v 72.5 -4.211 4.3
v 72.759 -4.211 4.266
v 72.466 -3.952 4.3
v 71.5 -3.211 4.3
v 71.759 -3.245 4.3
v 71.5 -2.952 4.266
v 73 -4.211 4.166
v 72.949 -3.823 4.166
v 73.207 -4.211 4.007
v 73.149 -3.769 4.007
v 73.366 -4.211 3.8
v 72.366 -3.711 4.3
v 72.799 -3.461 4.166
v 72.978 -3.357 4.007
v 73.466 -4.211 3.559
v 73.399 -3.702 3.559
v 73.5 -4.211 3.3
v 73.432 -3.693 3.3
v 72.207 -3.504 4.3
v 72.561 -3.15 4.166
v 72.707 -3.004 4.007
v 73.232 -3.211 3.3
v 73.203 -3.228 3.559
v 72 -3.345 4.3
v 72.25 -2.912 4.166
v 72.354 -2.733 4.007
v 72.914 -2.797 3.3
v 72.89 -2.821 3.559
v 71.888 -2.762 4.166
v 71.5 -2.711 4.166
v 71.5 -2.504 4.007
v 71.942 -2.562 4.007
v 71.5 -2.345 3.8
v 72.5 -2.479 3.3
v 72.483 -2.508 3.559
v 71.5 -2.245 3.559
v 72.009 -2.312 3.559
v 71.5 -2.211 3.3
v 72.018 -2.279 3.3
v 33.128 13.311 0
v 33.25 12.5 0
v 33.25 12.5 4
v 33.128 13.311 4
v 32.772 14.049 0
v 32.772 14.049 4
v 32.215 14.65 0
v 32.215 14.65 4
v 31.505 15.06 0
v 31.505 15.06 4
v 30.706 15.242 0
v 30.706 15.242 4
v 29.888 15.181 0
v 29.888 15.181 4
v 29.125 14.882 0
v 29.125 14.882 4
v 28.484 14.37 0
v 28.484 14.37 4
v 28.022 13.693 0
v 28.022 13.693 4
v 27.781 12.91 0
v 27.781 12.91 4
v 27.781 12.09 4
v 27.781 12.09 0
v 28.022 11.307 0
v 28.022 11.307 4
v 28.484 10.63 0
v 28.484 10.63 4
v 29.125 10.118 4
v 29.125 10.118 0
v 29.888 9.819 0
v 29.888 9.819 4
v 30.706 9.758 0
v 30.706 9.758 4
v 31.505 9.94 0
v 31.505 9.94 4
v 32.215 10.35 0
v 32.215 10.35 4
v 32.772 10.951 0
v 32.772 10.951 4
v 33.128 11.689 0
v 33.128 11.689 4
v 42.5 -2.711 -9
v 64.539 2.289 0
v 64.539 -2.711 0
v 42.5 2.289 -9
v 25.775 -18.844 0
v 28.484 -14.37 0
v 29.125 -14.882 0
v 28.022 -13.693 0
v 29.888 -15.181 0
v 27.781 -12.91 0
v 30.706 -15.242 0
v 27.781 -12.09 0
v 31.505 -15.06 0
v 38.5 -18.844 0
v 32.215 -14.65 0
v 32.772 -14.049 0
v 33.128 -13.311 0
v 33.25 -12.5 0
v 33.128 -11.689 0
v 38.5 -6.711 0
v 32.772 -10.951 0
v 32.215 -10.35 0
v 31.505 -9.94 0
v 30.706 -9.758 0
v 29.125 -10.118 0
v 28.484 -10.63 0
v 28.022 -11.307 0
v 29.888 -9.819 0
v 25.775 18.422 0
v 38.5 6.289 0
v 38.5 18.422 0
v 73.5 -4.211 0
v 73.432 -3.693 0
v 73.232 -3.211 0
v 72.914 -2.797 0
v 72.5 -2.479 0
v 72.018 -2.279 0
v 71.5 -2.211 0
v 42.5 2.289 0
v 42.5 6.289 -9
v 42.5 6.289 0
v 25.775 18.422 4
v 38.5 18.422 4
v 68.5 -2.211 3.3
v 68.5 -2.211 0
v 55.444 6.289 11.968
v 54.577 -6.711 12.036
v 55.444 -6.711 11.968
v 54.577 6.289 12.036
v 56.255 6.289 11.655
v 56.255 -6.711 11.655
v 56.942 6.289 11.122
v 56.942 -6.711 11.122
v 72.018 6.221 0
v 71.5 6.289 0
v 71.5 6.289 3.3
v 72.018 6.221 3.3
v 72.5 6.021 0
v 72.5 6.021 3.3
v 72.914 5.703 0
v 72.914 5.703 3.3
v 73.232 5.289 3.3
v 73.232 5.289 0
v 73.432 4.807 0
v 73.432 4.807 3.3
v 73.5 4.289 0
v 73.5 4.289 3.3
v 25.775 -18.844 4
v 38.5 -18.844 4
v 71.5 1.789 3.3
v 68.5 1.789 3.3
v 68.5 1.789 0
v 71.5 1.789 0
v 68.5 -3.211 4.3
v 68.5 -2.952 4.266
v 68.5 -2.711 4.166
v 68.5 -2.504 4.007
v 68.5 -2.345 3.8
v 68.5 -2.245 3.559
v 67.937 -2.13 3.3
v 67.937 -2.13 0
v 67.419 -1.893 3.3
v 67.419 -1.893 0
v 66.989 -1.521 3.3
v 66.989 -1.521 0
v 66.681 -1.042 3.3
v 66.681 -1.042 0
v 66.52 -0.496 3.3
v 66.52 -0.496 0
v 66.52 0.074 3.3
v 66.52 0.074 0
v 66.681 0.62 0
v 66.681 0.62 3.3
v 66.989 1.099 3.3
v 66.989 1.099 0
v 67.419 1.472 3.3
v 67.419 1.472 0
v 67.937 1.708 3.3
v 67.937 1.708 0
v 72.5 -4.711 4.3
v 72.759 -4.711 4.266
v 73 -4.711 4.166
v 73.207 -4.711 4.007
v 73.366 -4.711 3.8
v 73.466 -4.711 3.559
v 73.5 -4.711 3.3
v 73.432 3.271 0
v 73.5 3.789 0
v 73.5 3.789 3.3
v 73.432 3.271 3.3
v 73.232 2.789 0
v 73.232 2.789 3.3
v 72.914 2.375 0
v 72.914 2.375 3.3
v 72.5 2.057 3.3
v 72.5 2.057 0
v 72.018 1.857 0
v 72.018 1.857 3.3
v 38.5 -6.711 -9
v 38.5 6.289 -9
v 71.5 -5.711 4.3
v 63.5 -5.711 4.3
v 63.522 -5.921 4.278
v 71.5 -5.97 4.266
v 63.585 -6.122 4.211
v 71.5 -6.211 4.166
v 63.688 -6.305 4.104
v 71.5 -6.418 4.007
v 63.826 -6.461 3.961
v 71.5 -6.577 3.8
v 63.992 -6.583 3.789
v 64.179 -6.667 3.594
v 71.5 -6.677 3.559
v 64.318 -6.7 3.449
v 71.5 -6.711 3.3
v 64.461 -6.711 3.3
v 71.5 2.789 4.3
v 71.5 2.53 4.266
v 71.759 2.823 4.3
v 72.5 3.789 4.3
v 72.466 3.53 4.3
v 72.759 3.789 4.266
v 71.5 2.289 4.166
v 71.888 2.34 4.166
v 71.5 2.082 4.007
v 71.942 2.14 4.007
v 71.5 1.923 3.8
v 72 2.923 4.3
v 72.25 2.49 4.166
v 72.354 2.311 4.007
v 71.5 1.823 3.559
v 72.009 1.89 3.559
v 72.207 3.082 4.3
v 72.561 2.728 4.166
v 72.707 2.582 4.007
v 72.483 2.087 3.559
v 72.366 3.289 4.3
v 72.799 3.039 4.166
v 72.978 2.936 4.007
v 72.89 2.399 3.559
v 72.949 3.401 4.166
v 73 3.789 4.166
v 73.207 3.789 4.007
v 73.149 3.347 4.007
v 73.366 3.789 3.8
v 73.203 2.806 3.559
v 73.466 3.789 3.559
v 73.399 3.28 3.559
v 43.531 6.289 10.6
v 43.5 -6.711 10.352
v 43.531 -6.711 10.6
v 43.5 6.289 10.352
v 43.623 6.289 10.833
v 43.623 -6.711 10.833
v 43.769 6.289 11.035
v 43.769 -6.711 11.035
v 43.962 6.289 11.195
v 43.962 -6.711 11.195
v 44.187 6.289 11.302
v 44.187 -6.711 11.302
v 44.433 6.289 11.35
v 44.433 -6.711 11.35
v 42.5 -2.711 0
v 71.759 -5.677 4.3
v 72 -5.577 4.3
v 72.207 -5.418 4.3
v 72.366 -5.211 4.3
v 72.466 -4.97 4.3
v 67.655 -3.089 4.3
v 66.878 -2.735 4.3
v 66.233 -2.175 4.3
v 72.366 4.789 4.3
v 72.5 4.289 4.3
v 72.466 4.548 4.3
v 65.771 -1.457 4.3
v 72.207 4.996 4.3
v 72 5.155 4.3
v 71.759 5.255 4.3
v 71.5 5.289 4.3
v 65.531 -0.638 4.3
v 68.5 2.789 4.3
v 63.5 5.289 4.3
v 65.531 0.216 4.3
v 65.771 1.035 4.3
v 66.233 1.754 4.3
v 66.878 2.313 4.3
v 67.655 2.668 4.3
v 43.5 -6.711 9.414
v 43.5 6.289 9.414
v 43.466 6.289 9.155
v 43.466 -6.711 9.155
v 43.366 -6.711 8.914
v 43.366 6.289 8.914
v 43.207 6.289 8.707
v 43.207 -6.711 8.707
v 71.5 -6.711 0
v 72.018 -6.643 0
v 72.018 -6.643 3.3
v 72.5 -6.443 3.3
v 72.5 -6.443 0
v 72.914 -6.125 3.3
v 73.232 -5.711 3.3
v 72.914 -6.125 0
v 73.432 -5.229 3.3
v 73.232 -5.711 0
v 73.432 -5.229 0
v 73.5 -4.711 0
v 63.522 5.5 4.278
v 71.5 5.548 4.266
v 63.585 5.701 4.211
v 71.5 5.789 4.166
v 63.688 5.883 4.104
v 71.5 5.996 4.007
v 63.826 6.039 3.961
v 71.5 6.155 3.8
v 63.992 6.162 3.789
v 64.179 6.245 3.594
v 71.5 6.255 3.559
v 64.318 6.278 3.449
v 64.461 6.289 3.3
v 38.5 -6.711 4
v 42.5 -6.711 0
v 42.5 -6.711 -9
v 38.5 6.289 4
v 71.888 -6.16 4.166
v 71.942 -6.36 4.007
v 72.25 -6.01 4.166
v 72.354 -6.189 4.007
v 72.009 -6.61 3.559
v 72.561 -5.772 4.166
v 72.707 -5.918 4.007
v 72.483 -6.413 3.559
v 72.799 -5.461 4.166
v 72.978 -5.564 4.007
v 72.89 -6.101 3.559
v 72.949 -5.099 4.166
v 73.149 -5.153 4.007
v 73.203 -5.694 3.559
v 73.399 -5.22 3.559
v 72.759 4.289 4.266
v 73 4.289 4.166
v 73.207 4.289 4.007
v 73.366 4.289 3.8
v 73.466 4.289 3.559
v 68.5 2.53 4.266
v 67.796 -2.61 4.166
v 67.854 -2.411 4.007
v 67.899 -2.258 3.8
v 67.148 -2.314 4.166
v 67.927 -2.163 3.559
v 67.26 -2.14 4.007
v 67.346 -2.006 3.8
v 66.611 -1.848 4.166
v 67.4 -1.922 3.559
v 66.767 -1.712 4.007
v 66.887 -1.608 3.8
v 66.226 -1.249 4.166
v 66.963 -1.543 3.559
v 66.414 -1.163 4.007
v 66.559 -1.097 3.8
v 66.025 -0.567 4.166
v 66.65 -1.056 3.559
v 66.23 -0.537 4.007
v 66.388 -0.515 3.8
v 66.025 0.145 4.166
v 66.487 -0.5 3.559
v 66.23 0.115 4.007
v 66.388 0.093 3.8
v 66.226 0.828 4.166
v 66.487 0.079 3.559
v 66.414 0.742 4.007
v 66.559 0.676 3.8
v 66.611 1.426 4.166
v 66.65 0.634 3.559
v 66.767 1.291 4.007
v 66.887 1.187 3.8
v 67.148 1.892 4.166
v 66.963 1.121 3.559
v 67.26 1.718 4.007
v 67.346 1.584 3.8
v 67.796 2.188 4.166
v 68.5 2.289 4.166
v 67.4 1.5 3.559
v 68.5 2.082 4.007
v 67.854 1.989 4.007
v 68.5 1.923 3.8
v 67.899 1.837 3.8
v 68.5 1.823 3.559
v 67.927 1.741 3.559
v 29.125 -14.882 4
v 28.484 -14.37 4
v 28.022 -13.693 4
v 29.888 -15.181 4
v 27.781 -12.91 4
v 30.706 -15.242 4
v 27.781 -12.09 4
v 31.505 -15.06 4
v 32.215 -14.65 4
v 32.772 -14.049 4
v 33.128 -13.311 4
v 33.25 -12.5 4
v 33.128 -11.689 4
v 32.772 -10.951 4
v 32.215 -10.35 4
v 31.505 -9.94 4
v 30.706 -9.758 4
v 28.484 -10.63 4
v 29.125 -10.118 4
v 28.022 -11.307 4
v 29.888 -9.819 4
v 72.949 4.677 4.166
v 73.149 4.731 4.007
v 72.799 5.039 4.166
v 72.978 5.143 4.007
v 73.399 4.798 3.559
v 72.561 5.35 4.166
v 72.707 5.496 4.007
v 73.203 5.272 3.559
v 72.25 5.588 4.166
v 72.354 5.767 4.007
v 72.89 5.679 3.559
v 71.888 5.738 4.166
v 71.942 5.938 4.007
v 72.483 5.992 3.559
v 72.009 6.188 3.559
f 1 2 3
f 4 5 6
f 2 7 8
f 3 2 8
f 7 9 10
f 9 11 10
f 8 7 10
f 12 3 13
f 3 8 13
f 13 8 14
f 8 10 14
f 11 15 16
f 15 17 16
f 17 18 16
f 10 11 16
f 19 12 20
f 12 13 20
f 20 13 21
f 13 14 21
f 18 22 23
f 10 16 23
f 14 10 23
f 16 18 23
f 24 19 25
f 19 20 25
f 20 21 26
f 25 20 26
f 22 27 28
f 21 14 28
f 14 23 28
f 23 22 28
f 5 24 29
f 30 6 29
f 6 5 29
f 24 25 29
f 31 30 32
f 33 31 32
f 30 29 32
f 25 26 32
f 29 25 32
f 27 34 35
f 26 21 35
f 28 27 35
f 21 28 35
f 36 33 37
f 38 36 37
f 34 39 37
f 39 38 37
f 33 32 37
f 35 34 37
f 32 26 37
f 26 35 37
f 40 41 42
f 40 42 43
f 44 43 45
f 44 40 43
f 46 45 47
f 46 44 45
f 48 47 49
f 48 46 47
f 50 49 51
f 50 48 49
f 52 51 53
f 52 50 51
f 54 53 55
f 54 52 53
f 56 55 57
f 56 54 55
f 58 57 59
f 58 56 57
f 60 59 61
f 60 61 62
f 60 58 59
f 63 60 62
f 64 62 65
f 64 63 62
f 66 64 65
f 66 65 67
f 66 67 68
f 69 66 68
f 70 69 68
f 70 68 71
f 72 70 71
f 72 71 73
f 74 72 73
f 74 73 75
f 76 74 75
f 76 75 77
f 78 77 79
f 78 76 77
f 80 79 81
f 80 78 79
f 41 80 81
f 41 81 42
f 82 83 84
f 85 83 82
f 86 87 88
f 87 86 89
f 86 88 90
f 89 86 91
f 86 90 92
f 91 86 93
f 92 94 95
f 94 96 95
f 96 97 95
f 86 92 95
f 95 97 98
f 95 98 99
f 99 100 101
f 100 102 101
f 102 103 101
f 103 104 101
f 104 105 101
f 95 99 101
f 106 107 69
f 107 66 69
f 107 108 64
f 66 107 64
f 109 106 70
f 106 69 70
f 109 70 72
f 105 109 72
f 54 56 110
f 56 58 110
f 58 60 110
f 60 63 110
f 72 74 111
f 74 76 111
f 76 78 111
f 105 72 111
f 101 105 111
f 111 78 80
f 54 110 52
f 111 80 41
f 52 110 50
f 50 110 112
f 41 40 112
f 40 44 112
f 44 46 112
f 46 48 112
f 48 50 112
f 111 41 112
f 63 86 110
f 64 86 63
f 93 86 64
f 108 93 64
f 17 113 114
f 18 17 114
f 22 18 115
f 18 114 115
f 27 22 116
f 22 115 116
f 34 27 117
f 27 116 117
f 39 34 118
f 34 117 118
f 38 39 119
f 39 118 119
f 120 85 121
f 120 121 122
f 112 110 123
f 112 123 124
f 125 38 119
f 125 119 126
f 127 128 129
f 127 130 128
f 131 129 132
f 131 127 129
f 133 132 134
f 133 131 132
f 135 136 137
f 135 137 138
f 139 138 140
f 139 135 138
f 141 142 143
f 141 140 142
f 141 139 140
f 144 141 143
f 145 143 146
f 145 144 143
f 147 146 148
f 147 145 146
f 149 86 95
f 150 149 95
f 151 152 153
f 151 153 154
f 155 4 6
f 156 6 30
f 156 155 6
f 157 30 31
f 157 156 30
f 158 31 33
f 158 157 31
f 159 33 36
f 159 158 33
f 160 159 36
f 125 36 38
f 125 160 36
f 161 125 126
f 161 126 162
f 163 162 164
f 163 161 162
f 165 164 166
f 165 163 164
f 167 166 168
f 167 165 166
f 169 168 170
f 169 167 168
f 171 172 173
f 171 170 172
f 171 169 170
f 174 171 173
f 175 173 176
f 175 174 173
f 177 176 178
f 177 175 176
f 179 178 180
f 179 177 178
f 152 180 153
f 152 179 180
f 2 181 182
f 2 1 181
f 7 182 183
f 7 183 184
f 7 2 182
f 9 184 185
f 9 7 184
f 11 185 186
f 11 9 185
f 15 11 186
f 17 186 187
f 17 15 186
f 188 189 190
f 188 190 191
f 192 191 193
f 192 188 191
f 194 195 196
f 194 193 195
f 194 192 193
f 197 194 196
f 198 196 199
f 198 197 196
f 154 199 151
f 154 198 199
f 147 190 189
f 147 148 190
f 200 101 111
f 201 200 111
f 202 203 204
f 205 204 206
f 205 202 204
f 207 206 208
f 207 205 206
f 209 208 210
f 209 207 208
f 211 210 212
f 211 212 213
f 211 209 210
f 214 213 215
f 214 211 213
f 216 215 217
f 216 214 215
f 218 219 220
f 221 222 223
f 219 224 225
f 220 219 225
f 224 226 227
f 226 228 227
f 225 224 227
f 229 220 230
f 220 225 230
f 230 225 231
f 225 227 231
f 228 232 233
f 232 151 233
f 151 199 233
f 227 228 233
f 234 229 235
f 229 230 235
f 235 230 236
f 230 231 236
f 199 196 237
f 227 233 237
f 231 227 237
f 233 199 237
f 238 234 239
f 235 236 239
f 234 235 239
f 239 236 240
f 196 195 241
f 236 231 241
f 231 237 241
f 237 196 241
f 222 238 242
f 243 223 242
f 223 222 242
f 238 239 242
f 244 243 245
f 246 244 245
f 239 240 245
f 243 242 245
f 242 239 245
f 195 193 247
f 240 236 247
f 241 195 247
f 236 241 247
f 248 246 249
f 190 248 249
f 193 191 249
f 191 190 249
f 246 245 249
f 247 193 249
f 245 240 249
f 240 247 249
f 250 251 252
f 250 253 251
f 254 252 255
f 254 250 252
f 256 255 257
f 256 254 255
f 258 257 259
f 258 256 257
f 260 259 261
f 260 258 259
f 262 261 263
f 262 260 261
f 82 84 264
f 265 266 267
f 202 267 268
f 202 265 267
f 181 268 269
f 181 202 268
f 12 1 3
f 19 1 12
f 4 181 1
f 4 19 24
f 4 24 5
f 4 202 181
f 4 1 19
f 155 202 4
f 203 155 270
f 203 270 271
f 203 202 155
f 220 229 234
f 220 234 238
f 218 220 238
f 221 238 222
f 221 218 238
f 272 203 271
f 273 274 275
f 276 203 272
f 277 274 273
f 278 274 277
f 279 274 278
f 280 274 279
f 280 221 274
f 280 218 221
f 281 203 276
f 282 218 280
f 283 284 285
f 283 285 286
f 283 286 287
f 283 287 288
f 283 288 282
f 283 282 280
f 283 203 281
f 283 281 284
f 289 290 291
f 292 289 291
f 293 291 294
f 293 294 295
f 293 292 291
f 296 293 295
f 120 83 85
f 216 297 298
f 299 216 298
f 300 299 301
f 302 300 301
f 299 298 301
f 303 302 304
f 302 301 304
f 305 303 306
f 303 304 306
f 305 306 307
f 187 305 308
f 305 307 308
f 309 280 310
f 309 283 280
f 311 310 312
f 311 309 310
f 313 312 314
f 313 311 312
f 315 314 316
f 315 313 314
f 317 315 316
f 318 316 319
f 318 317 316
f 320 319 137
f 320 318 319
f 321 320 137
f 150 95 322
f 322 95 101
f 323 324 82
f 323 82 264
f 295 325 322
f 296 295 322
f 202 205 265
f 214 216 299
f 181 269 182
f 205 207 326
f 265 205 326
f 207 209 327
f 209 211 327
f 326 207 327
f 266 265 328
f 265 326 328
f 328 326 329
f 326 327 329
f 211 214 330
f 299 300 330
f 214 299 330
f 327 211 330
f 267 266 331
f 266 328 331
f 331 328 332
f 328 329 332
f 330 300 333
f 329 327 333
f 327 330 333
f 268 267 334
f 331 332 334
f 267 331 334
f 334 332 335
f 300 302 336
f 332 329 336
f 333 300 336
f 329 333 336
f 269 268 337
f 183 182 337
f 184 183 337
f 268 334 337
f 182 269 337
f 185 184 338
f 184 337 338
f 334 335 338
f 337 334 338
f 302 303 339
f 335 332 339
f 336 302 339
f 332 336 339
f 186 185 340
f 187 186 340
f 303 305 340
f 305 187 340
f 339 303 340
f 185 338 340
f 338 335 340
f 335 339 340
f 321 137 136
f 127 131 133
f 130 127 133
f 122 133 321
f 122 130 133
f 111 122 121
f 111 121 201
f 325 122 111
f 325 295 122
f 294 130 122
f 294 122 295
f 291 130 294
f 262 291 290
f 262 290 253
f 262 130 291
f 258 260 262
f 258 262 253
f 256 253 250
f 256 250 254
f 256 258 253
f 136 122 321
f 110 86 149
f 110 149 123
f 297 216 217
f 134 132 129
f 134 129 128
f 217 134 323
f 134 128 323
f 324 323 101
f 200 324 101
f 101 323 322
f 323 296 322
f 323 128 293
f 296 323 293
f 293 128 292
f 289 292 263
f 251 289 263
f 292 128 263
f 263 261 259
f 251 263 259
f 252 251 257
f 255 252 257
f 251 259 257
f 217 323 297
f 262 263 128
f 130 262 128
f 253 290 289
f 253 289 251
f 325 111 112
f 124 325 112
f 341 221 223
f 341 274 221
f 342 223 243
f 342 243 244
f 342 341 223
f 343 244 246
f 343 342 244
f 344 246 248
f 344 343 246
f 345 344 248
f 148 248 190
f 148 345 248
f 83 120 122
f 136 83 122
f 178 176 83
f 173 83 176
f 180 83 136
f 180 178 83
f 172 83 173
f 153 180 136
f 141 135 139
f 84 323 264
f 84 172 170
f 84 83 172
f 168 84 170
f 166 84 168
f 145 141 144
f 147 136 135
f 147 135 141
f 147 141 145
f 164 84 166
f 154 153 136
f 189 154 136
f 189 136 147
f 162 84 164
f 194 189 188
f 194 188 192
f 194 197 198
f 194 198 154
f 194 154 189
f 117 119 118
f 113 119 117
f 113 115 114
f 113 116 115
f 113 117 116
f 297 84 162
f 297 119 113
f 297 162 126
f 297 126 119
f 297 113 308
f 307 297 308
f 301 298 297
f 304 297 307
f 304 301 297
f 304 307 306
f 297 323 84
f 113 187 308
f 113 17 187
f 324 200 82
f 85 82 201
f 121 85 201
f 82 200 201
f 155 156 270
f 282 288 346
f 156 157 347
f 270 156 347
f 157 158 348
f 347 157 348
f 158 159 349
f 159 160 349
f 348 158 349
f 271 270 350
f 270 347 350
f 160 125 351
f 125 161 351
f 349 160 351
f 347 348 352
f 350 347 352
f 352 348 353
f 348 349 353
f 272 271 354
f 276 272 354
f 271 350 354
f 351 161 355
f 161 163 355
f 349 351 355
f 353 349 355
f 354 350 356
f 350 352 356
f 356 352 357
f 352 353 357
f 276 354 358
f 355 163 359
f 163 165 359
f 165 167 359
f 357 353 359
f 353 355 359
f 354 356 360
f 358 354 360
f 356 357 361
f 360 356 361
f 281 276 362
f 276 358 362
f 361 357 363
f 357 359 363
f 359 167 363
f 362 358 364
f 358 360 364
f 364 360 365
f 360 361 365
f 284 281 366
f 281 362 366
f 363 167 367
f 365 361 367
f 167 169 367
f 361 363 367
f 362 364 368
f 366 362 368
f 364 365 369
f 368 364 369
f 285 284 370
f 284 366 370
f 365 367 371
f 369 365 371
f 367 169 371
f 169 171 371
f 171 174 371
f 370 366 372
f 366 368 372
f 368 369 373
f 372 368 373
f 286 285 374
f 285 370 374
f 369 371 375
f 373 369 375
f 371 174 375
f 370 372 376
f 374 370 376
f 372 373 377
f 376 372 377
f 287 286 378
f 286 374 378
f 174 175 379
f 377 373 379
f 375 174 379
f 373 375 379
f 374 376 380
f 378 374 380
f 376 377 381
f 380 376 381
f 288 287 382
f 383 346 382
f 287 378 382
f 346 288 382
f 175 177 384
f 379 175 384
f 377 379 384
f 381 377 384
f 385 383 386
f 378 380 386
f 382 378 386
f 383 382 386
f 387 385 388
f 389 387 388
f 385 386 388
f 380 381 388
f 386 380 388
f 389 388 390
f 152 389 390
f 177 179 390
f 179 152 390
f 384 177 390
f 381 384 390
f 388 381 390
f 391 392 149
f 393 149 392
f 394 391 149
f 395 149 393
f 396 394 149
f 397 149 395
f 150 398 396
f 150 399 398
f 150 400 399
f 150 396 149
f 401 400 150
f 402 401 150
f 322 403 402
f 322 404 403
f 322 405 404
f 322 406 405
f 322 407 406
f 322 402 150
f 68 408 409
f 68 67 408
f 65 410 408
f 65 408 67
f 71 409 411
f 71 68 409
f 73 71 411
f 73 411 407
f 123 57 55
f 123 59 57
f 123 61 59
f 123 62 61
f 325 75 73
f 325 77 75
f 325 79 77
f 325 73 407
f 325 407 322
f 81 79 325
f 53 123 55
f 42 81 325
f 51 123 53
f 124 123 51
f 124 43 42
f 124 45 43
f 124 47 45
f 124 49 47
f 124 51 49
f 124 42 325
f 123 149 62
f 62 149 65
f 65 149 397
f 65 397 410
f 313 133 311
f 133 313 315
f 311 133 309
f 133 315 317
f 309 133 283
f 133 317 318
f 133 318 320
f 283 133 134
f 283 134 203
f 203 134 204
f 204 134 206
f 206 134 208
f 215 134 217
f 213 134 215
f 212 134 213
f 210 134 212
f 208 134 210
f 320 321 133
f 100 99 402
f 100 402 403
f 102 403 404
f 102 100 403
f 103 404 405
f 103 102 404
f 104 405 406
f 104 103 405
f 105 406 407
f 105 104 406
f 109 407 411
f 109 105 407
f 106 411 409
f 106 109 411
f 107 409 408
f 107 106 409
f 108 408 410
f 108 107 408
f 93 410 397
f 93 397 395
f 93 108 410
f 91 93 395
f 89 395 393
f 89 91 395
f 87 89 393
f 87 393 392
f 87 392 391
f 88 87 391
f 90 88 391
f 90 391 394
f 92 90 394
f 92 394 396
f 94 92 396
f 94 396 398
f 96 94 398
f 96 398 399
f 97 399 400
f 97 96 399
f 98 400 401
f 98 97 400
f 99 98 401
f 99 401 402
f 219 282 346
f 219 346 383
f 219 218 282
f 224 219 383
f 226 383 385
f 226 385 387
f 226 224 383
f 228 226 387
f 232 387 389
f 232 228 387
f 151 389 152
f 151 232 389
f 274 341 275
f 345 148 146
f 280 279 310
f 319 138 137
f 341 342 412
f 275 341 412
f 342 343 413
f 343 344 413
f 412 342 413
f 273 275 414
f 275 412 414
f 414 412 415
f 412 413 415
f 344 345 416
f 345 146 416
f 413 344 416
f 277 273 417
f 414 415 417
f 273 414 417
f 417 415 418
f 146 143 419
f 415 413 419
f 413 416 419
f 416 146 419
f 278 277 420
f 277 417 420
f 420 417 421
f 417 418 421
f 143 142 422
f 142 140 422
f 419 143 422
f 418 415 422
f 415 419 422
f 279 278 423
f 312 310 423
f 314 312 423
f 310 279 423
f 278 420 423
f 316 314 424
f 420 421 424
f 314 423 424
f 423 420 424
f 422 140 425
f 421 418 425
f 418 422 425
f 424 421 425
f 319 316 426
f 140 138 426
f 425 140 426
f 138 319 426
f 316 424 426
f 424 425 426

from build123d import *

# Parameters (mm, degrees)
SKETCH_2_W          = 12.724713087
SKETCH_2_H          = 37.266218859
SKETCH_2_R          = 2.75
EXTRUDE_1_DEPTH     = 4
SKETCH_3_W          = 5
SKETCH_3_H          = 13
EXTRUDE_2_DEPTH     = 4
SKETCH_4_W          = 5
SKETCH_4_H          = 13
EXTRUDE_4_DEPTH     = 9
SKETCH_5_W          = 13.3
SKETCH_5_H          = 13
EXTRUDE_5_DEPTH     = 30
CUT_EXTRUDE_2_DEPTH = 78.033997806
EXTRUDE_6_DEPTH     = 13
FILLET_4_R          = 3
SKETCH_12_W         = 31
SKETCH_12_H         = 9
CUT_EXTRUDE_3_DEPTH = 79.606298904
RIB_1_REACH         = 78.775
SKETCH_13_WALL_W    = 179.357132042
SKETCH_13_WALL_H    = 5
CHAMFER_1_SIZE      = 5
FILLET_5_R          = 1
FILLET_6_R          = 2
FILLET_7_R          = 1


with BuildPart() as part:
    # 草图2 → 凸台-拉伸1 (new body)
    with BuildSketch(Plane.XY):
        with Locations((32.137643457, -0.210903357)):
            Rectangle(SKETCH_2_W, SKETCH_2_H)
        with Locations((30.5, -12.5)):
            Circle(SKETCH_2_R, mode=Mode.SUBTRACT)
        with Locations((30.5, 12.5)):
            Circle(SKETCH_2_R, mode=Mode.SUBTRACT)
    extrude(amount=EXTRUDE_1_DEPTH)

    # 草图3 → 凸台-拉伸2 (add)
    with BuildSketch(Plane(origin=(0, 230.908781145, 0), x_dir=(-1, 0, 0), z_dir=(0, 0, 1))):
        with Locations((-41, 231.119684502)):
            Rectangle(SKETCH_3_W, SKETCH_3_H)
    extrude(amount=EXTRUDE_2_DEPTH)

    # 草图4 → 凸台-拉伸4 (add)
    with BuildSketch(Plane.XY):
        with Locations((41, -0.210903358)):
            Rectangle(SKETCH_4_W, SKETCH_4_H)
    extrude(amount=-EXTRUDE_4_DEPTH)

    # 草图5 → 凸台-拉伸5 (add)
    with BuildSketch(Plane(origin=(43.5, 0, 0), x_dir=(0, 0, -1), z_dir=(1, 0, 0))):
        with Locations((2.35, -0.210903358)):
            Rectangle(SKETCH_5_W, SKETCH_5_H)
    extrude(amount=EXTRUDE_5_DEPTH)

    # 草图9 → 切除-拉伸2 (cut, through all)
    with BuildSketch(Plane.XY.offset(4.3)):
        with BuildLine():
            Line((68.5, 1.789096642), (73.5, 1.789096642))
            Line((73.5, 1.789096642), (73.5, -2.210903358))
            Line((73.5, -2.210903358), (68.5, -2.210903358))
            ThreePointArc((68.5, -2.210903358), (66.5, -0.210903358), (68.5, 1.789096642))
        make_face()
    extrude(amount=-CUT_EXTRUDE_2_DEPTH, mode=Mode.SUBTRACT)

    # 草图10 → 凸台-拉伸6 (add)
    with BuildSketch(Plane.XZ.offset(6.710903358)):
        Polygon((43.5, 11.286784974), (55.972995456, 12.130267128), (63.5, 4.3), (43.5, 4.3), align=None)
    extrude(amount=-EXTRUDE_6_DEPTH)

    # 圆角4
    fillet_4_edges = [part.edges().sort_by_distance(p)[0] for p in [
        (55.972995456, -0.210903358, 12.130267128),
    ]]
    fillet(fillet_4_edges, radius=FILLET_4_R)

    # 草图12 → 切除-拉伸3 (cut, through all)
    with BuildSketch(Plane.XZ.offset(6.710903358)):
        with Locations((58, -4.5)):
            Rectangle(SKETCH_12_W, SKETCH_12_H)
    extrude(amount=-CUT_EXTRUDE_3_DEPTH, mode=Mode.SUBTRACT)

    # 草图13 wall → 筋1 (add, up to next)
    with BuildSketch(Plane(origin=(53.519716797, -0.210903358, -4.5), x_dir=(-0.925784246104, 0, -0.378052284302), z_dir=(0.378052284302, 0, -0.925784246104)), mode=Mode.PRIVATE) as rib_1_sk1:
        Rectangle(SKETCH_13_WALL_W, SKETCH_13_WALL_H)
    rib_1_tool1 = extrude(rib_1_sk1.sketch, amount=-RIB_1_REACH, mode=Mode.PRIVATE) - part.part
    add(rib_1_tool1.solids().sort_by_distance((53.519716797, -0.210903358, -4.5))[0])

    # 倒角1
    chamfer_1_edges = [part.edges().sort_by_distance(p)[0] for p in [
        (43.5, -0.210903358, 4),
    ]]
    chamfer(chamfer_1_edges, length=CHAMFER_1_SIZE)

    # 圆角5
    fillet_5_edges = [part.edges().sort_by_distance(p)[0] for p in [
        (43.5, -0.210903358, 9),
        (43.5, -0.210903358, 11.286784974),
    ]]
    fillet(fillet_5_edges, radius=FILLET_5_R)

    # 圆角6
    fillet_6_edges = [part.edges().sort_by_distance(p)[0] for p in [
        (73.5, 1.789096642, 2.15),
        (73.5, -2.210903358, 2.15),
        (73.5, 6.289096642, 2.15),
        (73.5, -6.710903358, 2.15),
    ]]
    fillet(fillet_6_edges, radius=FILLET_6_R)

    # 圆角7
    fillet_7_edges = [part.edges().sort_by_distance(p)[0] for p in [
        (70, 1.789096642, 4.3),
        (67.5, -6.710903358, 4.3),
        (73.5, -4.460903358, 4.3),
        (73.5, 4.039096642, 4.3),
        (67.5, 6.289096642, 4.3),
        (72.914213562, -6.12511692, 4.3),
        (72.914213562, 5.703310205, 4.3),
        (72.914213562, -2.796689795, 4.3),
        (72.914213562, 2.37488308, 4.3),
        (66.5, -0.210903358, 4.3),
        (70, -2.210903358, 4.3),
    ]]
    fillet(fillet_7_edges, radius=FILLET_7_R)


solid = part.part
